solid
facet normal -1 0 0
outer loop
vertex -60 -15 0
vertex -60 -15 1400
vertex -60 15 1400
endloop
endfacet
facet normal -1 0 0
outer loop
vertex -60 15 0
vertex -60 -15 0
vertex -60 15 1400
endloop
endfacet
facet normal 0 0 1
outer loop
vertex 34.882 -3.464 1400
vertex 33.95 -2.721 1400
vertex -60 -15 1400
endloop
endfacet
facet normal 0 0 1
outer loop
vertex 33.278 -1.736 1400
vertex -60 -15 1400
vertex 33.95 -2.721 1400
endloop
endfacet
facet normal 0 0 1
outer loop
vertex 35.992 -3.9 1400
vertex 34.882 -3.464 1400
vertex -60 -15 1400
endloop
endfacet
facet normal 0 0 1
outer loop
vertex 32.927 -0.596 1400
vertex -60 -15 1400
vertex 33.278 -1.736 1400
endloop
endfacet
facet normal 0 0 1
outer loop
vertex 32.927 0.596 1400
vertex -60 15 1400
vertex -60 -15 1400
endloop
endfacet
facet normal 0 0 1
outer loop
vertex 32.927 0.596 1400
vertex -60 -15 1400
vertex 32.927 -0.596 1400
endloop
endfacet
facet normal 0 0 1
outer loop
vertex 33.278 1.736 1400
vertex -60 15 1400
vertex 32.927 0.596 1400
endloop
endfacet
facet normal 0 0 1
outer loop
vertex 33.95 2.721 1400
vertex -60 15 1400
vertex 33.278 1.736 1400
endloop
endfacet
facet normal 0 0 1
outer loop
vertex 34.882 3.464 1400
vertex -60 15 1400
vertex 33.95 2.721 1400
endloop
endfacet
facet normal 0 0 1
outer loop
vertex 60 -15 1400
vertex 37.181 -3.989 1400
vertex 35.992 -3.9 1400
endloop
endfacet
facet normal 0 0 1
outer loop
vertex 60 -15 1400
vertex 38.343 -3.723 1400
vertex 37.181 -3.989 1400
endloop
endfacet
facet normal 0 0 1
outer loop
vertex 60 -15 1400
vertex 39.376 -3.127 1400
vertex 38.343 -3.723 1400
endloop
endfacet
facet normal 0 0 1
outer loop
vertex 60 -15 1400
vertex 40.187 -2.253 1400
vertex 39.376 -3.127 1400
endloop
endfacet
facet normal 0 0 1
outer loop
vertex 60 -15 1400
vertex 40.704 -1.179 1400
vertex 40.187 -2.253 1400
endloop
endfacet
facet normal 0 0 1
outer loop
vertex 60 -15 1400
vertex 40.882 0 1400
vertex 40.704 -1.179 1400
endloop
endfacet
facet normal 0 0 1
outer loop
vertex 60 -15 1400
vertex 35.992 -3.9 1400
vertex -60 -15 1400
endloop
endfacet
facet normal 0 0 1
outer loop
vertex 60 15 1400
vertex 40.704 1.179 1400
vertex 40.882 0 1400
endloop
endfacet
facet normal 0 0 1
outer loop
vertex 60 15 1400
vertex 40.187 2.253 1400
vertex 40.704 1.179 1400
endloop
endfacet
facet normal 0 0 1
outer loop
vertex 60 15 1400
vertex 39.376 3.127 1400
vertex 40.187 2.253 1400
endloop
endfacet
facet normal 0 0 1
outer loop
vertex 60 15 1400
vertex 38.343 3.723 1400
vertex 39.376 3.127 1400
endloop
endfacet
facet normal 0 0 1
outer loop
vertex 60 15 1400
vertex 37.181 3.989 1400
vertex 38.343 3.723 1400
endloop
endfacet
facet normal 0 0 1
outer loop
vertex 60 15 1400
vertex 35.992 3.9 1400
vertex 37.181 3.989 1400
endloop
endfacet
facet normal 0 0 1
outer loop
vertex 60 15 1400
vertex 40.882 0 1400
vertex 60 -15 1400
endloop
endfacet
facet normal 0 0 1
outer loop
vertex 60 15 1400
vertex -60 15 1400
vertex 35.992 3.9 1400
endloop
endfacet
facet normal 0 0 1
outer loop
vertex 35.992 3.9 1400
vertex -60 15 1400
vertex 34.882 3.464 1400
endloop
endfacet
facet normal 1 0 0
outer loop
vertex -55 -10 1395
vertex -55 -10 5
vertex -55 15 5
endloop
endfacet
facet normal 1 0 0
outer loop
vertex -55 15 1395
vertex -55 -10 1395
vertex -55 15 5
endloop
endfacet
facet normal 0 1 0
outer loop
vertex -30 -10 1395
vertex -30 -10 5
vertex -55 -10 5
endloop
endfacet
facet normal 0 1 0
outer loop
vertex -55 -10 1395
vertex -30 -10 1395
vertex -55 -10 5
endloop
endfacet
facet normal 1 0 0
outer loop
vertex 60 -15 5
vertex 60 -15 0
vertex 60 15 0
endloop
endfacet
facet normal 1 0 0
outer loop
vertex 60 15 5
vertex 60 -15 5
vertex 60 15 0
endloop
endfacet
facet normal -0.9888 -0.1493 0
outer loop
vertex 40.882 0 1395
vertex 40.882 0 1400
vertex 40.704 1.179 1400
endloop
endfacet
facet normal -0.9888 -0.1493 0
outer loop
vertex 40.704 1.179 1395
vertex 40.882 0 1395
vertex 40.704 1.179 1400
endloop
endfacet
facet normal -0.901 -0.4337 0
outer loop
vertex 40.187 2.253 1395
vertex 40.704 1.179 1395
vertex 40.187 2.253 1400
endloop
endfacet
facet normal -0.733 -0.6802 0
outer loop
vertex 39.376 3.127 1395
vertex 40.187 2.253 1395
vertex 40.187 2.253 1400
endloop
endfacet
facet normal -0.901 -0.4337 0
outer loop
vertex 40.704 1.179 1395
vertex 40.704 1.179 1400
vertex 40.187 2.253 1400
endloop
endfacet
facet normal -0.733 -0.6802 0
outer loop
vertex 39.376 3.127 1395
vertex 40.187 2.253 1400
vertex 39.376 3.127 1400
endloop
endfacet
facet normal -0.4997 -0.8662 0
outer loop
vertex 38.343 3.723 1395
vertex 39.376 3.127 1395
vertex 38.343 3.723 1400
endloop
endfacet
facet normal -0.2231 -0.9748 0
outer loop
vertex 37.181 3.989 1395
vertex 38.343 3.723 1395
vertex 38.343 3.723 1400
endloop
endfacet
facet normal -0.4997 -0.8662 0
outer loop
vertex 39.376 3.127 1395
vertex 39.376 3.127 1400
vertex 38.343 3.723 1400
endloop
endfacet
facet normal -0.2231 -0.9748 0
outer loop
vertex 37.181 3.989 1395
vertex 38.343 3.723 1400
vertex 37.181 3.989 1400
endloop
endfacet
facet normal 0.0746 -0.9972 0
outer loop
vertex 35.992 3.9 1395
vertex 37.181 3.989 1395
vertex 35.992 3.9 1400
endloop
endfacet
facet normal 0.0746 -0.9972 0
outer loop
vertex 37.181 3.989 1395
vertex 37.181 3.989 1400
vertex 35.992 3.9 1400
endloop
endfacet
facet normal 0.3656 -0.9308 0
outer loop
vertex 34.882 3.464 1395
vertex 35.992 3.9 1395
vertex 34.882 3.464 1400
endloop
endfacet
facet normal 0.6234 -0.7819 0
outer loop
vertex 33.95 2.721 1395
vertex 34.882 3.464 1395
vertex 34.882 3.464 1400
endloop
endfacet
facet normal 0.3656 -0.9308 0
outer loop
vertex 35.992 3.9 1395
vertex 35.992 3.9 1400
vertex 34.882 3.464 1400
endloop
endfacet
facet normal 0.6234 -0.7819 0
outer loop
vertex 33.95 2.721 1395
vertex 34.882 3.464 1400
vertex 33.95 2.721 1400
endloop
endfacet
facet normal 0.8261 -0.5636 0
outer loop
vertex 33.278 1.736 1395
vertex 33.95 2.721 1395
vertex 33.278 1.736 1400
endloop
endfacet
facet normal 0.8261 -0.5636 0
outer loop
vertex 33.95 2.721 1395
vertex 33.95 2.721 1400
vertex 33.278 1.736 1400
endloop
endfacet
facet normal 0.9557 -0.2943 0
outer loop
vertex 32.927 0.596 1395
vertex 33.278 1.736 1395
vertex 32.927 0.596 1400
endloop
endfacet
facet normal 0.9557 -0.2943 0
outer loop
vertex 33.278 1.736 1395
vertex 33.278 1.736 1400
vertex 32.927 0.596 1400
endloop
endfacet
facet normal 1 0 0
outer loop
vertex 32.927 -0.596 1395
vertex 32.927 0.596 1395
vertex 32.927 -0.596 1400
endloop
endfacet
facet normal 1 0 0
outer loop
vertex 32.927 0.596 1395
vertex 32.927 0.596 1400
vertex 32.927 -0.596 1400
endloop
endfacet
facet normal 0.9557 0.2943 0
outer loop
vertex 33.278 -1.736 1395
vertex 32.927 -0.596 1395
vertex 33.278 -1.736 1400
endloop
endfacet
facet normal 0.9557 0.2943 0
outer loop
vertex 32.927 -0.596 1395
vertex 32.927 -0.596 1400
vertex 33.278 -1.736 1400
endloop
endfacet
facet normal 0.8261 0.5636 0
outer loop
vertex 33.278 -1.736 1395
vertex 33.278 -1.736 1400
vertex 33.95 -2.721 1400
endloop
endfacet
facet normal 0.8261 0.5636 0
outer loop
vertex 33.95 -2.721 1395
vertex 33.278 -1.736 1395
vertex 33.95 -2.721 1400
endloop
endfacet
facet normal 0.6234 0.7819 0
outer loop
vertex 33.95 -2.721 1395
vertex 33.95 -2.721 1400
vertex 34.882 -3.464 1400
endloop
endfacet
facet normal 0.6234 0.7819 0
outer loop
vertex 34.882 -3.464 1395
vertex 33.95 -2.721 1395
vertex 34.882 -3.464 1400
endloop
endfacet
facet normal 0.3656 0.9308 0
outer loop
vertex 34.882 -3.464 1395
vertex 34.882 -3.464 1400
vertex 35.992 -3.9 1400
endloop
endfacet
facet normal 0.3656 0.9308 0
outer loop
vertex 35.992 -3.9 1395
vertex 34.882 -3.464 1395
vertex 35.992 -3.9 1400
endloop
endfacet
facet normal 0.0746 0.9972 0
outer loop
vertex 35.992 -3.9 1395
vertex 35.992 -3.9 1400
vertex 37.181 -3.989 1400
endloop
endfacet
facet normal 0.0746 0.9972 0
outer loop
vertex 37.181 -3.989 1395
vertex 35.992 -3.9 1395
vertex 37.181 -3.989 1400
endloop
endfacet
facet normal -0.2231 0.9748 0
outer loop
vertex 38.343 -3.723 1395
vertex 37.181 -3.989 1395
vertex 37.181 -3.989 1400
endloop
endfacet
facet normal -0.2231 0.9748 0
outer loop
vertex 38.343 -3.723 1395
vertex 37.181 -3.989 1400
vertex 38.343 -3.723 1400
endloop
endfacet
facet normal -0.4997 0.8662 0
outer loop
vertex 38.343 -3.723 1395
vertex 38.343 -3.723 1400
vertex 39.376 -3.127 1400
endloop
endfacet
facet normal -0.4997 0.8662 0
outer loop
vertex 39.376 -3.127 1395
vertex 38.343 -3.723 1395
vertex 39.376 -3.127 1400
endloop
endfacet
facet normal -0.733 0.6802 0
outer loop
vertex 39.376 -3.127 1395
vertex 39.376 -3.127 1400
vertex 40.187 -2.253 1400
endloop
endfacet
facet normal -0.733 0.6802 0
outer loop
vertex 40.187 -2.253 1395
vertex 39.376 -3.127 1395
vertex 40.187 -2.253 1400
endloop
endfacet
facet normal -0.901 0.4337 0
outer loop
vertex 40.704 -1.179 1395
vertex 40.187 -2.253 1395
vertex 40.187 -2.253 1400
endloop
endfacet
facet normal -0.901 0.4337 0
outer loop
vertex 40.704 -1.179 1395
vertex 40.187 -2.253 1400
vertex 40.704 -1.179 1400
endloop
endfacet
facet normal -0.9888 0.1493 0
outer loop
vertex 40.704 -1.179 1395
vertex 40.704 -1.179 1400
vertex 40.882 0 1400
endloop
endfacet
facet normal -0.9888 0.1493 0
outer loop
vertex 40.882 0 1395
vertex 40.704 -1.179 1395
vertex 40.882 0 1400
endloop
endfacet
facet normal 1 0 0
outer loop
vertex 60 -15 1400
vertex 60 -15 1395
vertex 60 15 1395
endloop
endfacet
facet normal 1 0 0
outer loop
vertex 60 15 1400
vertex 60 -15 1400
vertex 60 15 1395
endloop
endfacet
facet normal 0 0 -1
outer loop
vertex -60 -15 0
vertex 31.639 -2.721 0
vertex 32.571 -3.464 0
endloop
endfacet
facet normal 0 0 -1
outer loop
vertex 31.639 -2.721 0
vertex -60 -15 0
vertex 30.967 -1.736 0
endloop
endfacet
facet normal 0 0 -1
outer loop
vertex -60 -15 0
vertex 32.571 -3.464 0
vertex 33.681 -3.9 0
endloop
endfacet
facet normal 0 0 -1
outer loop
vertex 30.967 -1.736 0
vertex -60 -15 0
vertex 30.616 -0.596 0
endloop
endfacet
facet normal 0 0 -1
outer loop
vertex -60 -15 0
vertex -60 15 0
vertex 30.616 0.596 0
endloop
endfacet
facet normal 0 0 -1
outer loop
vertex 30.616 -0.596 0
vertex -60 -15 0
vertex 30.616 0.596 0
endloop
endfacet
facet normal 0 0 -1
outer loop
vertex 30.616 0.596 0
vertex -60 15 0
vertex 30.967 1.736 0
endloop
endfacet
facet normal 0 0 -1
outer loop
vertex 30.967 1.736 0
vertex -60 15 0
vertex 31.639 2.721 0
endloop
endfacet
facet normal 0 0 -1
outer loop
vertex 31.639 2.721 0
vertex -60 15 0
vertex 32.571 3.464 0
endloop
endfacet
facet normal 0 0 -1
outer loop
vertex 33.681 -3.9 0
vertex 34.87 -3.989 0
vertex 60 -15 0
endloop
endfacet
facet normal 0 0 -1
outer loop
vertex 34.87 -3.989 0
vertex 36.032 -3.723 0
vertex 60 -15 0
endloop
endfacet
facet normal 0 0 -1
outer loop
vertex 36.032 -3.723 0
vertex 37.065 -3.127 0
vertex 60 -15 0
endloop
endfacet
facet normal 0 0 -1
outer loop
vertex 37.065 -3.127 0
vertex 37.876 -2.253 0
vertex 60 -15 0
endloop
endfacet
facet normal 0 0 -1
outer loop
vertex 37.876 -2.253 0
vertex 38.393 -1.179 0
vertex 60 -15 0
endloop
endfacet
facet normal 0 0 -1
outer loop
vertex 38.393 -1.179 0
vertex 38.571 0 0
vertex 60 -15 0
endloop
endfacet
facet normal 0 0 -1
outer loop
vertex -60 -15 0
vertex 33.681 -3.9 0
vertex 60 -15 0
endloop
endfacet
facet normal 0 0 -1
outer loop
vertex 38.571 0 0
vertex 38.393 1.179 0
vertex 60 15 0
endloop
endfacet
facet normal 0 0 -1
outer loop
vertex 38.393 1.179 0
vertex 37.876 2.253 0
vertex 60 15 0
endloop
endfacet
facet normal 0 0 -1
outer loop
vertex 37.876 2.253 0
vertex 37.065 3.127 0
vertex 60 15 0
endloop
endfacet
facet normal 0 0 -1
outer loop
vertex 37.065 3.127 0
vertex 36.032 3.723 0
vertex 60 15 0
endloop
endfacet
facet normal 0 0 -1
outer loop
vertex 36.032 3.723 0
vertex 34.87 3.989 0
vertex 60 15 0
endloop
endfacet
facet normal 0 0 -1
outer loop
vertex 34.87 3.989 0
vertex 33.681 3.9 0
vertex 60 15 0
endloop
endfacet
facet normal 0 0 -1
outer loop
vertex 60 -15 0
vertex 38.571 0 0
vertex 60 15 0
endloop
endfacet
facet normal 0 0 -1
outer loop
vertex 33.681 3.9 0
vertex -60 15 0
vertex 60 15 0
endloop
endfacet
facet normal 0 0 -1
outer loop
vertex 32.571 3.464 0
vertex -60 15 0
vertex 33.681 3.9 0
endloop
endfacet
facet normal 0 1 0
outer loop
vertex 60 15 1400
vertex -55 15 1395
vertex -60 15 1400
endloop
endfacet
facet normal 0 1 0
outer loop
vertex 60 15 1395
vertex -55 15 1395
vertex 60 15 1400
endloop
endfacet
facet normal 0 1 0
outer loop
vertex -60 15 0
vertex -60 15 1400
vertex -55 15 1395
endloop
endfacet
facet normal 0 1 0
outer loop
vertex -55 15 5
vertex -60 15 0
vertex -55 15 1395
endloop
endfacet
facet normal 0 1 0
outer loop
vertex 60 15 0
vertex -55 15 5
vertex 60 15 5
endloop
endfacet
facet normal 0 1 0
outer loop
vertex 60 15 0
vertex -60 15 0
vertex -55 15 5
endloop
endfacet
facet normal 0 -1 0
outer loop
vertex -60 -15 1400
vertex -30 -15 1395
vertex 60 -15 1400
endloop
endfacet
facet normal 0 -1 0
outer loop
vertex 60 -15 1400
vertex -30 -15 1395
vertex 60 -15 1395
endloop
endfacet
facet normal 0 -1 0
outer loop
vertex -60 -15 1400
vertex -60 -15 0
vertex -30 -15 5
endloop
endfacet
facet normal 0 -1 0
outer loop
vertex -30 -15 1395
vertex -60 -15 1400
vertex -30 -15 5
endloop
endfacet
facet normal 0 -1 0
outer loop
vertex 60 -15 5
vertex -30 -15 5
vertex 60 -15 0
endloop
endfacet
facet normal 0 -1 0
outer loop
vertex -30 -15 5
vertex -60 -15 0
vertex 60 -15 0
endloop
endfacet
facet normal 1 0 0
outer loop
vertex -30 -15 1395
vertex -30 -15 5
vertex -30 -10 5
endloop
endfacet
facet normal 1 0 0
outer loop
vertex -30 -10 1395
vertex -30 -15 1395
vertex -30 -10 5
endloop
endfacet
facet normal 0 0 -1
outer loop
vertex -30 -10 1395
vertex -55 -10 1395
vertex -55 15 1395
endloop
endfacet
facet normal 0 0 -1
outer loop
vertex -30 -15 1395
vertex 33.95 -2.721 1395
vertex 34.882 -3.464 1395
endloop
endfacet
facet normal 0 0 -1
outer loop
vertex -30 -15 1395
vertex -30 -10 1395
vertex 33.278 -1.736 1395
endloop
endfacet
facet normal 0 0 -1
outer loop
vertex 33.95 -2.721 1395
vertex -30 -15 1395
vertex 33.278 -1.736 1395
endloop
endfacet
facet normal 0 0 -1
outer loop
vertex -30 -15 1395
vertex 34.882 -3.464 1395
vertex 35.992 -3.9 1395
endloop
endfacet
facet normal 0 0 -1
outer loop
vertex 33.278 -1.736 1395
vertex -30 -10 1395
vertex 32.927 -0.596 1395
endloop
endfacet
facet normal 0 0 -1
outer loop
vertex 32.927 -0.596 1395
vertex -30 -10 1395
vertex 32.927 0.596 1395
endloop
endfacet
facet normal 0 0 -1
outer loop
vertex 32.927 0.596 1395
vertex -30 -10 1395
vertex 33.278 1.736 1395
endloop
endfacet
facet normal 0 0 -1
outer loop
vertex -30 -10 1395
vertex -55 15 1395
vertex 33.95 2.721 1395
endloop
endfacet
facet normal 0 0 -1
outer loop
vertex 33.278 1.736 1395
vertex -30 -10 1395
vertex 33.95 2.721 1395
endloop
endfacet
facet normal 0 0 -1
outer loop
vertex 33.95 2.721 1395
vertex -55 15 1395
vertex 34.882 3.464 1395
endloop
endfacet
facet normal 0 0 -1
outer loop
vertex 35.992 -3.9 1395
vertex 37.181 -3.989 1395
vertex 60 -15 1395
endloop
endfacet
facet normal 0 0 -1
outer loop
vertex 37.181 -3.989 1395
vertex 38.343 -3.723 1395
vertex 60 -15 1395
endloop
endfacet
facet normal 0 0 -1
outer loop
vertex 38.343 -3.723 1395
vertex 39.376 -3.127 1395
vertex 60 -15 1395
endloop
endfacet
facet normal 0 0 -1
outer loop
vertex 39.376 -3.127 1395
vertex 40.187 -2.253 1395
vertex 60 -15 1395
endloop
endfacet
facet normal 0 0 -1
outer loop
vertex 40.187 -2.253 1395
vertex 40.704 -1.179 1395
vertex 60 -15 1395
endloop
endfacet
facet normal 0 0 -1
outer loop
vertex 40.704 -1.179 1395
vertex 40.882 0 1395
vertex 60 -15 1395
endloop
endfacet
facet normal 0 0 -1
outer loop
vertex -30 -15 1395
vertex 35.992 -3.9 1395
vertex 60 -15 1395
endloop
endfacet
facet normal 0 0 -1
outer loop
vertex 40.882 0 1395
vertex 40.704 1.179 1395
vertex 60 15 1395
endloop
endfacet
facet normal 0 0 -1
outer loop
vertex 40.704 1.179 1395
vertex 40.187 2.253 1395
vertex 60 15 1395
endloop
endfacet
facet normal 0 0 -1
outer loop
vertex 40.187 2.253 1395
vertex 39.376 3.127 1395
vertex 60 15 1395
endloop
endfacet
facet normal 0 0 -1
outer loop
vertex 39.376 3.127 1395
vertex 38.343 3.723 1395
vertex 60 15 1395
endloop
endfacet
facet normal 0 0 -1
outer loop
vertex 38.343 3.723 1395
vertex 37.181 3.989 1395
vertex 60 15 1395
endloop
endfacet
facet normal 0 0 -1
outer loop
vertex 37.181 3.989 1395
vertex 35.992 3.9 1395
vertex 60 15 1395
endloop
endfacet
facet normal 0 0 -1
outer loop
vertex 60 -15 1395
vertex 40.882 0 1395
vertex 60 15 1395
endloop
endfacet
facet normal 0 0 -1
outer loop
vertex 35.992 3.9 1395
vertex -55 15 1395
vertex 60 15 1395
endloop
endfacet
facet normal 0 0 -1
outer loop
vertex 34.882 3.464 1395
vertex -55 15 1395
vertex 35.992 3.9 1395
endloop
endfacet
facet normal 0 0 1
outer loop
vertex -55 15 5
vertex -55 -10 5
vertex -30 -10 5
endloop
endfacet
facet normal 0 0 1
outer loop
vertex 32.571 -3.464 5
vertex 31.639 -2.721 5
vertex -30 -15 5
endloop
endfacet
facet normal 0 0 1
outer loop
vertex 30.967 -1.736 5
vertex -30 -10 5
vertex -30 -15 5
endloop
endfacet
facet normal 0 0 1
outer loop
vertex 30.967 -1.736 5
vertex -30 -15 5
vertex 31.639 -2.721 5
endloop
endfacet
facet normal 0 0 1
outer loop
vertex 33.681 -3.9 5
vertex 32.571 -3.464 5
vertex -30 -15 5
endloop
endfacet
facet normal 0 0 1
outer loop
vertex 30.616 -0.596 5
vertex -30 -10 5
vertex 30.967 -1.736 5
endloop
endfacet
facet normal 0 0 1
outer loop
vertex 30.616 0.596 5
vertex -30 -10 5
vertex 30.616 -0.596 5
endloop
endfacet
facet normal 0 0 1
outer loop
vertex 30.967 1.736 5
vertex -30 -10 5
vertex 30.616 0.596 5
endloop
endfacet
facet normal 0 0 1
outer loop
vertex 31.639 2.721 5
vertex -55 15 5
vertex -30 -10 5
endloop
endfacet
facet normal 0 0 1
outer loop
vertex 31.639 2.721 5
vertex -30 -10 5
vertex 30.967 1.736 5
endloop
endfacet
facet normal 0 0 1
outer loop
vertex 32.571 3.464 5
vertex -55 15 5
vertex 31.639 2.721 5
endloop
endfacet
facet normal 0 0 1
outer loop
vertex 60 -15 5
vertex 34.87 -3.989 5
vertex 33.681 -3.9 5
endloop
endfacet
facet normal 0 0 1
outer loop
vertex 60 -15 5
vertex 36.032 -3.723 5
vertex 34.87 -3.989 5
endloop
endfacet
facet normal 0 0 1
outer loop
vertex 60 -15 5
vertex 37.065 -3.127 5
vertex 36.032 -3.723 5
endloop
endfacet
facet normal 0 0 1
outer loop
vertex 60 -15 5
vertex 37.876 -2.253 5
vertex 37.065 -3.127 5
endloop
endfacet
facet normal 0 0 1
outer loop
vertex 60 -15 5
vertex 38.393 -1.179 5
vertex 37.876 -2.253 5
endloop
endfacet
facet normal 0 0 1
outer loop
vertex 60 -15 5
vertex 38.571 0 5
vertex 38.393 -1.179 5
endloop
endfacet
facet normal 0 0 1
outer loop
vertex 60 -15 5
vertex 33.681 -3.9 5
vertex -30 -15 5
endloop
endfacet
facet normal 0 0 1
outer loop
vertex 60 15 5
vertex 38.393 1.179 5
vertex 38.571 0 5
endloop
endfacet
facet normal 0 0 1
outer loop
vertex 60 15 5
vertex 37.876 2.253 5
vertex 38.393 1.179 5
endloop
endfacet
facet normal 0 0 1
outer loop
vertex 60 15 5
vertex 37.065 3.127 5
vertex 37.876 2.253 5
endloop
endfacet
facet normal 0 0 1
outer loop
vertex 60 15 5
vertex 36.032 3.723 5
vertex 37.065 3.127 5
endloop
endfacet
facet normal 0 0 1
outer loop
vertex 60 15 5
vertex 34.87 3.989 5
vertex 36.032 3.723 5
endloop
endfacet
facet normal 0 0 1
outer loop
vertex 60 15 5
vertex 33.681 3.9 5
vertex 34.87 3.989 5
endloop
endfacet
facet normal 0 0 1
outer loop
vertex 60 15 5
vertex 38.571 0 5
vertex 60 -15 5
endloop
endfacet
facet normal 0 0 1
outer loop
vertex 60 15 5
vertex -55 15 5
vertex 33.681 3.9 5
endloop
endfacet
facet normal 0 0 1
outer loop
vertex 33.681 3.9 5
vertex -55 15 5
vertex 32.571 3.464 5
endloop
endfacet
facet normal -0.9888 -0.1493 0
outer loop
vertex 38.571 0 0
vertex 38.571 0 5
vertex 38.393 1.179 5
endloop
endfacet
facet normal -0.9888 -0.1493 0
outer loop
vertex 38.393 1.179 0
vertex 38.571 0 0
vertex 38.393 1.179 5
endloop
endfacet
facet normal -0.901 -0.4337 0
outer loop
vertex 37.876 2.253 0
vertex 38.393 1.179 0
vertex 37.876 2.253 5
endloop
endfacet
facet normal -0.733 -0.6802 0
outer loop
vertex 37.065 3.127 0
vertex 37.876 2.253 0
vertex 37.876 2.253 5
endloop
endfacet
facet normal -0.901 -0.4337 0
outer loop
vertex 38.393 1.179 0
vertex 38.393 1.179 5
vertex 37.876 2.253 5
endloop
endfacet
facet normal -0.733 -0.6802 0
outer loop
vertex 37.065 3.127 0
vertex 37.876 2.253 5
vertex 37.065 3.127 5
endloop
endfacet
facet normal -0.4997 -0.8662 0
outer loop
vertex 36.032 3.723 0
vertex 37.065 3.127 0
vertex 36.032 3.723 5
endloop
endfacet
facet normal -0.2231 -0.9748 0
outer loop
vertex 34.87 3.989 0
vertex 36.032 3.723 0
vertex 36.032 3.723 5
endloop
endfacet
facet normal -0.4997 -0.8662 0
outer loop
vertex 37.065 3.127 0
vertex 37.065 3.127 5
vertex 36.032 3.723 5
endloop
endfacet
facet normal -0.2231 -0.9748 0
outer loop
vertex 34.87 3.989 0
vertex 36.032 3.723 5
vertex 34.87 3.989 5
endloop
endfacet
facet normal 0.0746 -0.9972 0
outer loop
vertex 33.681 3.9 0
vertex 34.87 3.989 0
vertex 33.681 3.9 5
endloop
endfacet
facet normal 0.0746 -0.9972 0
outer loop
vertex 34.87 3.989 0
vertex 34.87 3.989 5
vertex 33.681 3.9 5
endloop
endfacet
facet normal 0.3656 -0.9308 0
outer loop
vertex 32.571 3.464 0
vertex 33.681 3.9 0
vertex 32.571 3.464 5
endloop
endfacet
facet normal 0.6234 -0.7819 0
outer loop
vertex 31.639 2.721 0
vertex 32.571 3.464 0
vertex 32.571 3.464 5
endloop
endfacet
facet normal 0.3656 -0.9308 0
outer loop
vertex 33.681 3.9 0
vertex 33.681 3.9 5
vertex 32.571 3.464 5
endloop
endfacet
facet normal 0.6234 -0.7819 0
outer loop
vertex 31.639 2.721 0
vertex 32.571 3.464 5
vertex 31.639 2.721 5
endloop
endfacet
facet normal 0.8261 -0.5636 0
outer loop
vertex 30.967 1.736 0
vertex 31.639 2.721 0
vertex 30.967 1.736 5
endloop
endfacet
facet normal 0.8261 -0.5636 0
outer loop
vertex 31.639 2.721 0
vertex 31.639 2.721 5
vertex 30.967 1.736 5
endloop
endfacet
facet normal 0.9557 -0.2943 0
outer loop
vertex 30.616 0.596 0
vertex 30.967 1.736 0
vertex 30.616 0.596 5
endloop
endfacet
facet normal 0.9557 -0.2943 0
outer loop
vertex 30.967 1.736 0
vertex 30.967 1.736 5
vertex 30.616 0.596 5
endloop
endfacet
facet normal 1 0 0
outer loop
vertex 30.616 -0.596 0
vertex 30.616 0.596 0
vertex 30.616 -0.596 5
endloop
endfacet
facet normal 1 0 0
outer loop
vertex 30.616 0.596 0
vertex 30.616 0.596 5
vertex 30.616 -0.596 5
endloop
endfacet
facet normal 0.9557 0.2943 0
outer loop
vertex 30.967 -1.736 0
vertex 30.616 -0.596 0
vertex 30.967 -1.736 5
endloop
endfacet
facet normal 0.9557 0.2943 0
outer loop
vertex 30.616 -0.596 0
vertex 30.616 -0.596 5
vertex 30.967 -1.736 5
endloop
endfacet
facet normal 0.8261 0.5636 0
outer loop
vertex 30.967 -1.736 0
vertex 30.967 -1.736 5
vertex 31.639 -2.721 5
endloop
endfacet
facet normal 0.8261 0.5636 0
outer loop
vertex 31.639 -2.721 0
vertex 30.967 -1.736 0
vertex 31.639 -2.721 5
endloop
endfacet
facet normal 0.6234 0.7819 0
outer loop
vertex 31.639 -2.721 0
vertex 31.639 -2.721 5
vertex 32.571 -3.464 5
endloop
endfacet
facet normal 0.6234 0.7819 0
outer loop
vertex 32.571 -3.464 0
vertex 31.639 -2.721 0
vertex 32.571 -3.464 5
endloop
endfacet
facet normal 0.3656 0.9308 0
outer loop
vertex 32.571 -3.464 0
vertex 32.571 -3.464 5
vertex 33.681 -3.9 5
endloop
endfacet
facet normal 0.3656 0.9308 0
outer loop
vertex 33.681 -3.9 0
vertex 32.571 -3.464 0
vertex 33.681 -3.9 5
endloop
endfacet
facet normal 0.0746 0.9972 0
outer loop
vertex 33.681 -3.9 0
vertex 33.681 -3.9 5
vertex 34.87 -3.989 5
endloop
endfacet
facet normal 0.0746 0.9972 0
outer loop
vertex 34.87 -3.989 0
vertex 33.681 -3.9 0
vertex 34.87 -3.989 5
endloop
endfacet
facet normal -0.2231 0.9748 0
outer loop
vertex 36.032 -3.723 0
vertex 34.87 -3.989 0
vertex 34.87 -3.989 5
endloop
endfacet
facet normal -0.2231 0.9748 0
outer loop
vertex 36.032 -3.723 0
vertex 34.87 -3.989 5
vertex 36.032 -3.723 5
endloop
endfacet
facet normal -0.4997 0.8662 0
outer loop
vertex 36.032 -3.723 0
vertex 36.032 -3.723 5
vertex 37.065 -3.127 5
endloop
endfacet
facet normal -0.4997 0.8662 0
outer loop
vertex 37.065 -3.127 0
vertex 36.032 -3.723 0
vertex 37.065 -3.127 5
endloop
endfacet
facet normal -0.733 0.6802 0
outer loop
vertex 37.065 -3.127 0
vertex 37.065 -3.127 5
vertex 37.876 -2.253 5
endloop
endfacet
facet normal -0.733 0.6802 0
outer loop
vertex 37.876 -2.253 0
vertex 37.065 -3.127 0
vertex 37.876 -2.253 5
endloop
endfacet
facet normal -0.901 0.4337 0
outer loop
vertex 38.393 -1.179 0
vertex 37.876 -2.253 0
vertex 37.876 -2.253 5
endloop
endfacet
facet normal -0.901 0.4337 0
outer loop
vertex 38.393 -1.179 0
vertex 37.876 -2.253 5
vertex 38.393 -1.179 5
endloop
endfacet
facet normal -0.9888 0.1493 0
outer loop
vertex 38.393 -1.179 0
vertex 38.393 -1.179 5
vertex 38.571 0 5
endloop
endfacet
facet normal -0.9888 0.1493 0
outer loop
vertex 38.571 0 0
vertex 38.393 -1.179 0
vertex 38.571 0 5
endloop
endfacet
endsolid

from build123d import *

# Parameters (mm, degrees)
F0_W     = 120
F0_H     = 30
F1_DEPTH = 5
F3_DEPTH = 1390
F4_W     = 120
F4_H     = 30
F5_DEPTH = 5
F6_R     = 4
F7_DEPTH = 25
F8_R     = 4
F9_DEPTH = 25


with BuildPart() as f1:
    # F0 (on Top) → F1 (new body)
    with BuildSketch(Plane.XY):
        Rectangle(F0_W, F0_H)
    extrude(amount=F1_DEPTH)

    # F2 (on face) → F3 (join)
    with BuildSketch(Plane.XY.offset(5)):
        Polygon((-55, 15), (-60, 15), (-60, -15), (-30, -15), (-30, -10), (-55, -10), align=None)
    extrude(amount=F3_DEPTH)

    # F4 (on face) → F5 (join)
    with BuildSketch(Plane.XY.offset(1395)):
        Rectangle(F4_W, F4_H)
    extrude(amount=F5_DEPTH)

    # F6 (on face) → F7 (cut)
    with BuildSketch(Plane.XY.offset(1400)):
        with Locations((36.882059, 0)):
            Circle(F6_R)
    extrude(amount=-F7_DEPTH, mode=Mode.SUBTRACT)

    # F8 (on face) → F9 (cut)
    with BuildSketch(Plane.XY.offset(5)):
        with Locations((34.570879, 0)):
            Circle(F8_R)
    extrude(amount=-F9_DEPTH, mode=Mode.SUBTRACT)


solid = f1.part
